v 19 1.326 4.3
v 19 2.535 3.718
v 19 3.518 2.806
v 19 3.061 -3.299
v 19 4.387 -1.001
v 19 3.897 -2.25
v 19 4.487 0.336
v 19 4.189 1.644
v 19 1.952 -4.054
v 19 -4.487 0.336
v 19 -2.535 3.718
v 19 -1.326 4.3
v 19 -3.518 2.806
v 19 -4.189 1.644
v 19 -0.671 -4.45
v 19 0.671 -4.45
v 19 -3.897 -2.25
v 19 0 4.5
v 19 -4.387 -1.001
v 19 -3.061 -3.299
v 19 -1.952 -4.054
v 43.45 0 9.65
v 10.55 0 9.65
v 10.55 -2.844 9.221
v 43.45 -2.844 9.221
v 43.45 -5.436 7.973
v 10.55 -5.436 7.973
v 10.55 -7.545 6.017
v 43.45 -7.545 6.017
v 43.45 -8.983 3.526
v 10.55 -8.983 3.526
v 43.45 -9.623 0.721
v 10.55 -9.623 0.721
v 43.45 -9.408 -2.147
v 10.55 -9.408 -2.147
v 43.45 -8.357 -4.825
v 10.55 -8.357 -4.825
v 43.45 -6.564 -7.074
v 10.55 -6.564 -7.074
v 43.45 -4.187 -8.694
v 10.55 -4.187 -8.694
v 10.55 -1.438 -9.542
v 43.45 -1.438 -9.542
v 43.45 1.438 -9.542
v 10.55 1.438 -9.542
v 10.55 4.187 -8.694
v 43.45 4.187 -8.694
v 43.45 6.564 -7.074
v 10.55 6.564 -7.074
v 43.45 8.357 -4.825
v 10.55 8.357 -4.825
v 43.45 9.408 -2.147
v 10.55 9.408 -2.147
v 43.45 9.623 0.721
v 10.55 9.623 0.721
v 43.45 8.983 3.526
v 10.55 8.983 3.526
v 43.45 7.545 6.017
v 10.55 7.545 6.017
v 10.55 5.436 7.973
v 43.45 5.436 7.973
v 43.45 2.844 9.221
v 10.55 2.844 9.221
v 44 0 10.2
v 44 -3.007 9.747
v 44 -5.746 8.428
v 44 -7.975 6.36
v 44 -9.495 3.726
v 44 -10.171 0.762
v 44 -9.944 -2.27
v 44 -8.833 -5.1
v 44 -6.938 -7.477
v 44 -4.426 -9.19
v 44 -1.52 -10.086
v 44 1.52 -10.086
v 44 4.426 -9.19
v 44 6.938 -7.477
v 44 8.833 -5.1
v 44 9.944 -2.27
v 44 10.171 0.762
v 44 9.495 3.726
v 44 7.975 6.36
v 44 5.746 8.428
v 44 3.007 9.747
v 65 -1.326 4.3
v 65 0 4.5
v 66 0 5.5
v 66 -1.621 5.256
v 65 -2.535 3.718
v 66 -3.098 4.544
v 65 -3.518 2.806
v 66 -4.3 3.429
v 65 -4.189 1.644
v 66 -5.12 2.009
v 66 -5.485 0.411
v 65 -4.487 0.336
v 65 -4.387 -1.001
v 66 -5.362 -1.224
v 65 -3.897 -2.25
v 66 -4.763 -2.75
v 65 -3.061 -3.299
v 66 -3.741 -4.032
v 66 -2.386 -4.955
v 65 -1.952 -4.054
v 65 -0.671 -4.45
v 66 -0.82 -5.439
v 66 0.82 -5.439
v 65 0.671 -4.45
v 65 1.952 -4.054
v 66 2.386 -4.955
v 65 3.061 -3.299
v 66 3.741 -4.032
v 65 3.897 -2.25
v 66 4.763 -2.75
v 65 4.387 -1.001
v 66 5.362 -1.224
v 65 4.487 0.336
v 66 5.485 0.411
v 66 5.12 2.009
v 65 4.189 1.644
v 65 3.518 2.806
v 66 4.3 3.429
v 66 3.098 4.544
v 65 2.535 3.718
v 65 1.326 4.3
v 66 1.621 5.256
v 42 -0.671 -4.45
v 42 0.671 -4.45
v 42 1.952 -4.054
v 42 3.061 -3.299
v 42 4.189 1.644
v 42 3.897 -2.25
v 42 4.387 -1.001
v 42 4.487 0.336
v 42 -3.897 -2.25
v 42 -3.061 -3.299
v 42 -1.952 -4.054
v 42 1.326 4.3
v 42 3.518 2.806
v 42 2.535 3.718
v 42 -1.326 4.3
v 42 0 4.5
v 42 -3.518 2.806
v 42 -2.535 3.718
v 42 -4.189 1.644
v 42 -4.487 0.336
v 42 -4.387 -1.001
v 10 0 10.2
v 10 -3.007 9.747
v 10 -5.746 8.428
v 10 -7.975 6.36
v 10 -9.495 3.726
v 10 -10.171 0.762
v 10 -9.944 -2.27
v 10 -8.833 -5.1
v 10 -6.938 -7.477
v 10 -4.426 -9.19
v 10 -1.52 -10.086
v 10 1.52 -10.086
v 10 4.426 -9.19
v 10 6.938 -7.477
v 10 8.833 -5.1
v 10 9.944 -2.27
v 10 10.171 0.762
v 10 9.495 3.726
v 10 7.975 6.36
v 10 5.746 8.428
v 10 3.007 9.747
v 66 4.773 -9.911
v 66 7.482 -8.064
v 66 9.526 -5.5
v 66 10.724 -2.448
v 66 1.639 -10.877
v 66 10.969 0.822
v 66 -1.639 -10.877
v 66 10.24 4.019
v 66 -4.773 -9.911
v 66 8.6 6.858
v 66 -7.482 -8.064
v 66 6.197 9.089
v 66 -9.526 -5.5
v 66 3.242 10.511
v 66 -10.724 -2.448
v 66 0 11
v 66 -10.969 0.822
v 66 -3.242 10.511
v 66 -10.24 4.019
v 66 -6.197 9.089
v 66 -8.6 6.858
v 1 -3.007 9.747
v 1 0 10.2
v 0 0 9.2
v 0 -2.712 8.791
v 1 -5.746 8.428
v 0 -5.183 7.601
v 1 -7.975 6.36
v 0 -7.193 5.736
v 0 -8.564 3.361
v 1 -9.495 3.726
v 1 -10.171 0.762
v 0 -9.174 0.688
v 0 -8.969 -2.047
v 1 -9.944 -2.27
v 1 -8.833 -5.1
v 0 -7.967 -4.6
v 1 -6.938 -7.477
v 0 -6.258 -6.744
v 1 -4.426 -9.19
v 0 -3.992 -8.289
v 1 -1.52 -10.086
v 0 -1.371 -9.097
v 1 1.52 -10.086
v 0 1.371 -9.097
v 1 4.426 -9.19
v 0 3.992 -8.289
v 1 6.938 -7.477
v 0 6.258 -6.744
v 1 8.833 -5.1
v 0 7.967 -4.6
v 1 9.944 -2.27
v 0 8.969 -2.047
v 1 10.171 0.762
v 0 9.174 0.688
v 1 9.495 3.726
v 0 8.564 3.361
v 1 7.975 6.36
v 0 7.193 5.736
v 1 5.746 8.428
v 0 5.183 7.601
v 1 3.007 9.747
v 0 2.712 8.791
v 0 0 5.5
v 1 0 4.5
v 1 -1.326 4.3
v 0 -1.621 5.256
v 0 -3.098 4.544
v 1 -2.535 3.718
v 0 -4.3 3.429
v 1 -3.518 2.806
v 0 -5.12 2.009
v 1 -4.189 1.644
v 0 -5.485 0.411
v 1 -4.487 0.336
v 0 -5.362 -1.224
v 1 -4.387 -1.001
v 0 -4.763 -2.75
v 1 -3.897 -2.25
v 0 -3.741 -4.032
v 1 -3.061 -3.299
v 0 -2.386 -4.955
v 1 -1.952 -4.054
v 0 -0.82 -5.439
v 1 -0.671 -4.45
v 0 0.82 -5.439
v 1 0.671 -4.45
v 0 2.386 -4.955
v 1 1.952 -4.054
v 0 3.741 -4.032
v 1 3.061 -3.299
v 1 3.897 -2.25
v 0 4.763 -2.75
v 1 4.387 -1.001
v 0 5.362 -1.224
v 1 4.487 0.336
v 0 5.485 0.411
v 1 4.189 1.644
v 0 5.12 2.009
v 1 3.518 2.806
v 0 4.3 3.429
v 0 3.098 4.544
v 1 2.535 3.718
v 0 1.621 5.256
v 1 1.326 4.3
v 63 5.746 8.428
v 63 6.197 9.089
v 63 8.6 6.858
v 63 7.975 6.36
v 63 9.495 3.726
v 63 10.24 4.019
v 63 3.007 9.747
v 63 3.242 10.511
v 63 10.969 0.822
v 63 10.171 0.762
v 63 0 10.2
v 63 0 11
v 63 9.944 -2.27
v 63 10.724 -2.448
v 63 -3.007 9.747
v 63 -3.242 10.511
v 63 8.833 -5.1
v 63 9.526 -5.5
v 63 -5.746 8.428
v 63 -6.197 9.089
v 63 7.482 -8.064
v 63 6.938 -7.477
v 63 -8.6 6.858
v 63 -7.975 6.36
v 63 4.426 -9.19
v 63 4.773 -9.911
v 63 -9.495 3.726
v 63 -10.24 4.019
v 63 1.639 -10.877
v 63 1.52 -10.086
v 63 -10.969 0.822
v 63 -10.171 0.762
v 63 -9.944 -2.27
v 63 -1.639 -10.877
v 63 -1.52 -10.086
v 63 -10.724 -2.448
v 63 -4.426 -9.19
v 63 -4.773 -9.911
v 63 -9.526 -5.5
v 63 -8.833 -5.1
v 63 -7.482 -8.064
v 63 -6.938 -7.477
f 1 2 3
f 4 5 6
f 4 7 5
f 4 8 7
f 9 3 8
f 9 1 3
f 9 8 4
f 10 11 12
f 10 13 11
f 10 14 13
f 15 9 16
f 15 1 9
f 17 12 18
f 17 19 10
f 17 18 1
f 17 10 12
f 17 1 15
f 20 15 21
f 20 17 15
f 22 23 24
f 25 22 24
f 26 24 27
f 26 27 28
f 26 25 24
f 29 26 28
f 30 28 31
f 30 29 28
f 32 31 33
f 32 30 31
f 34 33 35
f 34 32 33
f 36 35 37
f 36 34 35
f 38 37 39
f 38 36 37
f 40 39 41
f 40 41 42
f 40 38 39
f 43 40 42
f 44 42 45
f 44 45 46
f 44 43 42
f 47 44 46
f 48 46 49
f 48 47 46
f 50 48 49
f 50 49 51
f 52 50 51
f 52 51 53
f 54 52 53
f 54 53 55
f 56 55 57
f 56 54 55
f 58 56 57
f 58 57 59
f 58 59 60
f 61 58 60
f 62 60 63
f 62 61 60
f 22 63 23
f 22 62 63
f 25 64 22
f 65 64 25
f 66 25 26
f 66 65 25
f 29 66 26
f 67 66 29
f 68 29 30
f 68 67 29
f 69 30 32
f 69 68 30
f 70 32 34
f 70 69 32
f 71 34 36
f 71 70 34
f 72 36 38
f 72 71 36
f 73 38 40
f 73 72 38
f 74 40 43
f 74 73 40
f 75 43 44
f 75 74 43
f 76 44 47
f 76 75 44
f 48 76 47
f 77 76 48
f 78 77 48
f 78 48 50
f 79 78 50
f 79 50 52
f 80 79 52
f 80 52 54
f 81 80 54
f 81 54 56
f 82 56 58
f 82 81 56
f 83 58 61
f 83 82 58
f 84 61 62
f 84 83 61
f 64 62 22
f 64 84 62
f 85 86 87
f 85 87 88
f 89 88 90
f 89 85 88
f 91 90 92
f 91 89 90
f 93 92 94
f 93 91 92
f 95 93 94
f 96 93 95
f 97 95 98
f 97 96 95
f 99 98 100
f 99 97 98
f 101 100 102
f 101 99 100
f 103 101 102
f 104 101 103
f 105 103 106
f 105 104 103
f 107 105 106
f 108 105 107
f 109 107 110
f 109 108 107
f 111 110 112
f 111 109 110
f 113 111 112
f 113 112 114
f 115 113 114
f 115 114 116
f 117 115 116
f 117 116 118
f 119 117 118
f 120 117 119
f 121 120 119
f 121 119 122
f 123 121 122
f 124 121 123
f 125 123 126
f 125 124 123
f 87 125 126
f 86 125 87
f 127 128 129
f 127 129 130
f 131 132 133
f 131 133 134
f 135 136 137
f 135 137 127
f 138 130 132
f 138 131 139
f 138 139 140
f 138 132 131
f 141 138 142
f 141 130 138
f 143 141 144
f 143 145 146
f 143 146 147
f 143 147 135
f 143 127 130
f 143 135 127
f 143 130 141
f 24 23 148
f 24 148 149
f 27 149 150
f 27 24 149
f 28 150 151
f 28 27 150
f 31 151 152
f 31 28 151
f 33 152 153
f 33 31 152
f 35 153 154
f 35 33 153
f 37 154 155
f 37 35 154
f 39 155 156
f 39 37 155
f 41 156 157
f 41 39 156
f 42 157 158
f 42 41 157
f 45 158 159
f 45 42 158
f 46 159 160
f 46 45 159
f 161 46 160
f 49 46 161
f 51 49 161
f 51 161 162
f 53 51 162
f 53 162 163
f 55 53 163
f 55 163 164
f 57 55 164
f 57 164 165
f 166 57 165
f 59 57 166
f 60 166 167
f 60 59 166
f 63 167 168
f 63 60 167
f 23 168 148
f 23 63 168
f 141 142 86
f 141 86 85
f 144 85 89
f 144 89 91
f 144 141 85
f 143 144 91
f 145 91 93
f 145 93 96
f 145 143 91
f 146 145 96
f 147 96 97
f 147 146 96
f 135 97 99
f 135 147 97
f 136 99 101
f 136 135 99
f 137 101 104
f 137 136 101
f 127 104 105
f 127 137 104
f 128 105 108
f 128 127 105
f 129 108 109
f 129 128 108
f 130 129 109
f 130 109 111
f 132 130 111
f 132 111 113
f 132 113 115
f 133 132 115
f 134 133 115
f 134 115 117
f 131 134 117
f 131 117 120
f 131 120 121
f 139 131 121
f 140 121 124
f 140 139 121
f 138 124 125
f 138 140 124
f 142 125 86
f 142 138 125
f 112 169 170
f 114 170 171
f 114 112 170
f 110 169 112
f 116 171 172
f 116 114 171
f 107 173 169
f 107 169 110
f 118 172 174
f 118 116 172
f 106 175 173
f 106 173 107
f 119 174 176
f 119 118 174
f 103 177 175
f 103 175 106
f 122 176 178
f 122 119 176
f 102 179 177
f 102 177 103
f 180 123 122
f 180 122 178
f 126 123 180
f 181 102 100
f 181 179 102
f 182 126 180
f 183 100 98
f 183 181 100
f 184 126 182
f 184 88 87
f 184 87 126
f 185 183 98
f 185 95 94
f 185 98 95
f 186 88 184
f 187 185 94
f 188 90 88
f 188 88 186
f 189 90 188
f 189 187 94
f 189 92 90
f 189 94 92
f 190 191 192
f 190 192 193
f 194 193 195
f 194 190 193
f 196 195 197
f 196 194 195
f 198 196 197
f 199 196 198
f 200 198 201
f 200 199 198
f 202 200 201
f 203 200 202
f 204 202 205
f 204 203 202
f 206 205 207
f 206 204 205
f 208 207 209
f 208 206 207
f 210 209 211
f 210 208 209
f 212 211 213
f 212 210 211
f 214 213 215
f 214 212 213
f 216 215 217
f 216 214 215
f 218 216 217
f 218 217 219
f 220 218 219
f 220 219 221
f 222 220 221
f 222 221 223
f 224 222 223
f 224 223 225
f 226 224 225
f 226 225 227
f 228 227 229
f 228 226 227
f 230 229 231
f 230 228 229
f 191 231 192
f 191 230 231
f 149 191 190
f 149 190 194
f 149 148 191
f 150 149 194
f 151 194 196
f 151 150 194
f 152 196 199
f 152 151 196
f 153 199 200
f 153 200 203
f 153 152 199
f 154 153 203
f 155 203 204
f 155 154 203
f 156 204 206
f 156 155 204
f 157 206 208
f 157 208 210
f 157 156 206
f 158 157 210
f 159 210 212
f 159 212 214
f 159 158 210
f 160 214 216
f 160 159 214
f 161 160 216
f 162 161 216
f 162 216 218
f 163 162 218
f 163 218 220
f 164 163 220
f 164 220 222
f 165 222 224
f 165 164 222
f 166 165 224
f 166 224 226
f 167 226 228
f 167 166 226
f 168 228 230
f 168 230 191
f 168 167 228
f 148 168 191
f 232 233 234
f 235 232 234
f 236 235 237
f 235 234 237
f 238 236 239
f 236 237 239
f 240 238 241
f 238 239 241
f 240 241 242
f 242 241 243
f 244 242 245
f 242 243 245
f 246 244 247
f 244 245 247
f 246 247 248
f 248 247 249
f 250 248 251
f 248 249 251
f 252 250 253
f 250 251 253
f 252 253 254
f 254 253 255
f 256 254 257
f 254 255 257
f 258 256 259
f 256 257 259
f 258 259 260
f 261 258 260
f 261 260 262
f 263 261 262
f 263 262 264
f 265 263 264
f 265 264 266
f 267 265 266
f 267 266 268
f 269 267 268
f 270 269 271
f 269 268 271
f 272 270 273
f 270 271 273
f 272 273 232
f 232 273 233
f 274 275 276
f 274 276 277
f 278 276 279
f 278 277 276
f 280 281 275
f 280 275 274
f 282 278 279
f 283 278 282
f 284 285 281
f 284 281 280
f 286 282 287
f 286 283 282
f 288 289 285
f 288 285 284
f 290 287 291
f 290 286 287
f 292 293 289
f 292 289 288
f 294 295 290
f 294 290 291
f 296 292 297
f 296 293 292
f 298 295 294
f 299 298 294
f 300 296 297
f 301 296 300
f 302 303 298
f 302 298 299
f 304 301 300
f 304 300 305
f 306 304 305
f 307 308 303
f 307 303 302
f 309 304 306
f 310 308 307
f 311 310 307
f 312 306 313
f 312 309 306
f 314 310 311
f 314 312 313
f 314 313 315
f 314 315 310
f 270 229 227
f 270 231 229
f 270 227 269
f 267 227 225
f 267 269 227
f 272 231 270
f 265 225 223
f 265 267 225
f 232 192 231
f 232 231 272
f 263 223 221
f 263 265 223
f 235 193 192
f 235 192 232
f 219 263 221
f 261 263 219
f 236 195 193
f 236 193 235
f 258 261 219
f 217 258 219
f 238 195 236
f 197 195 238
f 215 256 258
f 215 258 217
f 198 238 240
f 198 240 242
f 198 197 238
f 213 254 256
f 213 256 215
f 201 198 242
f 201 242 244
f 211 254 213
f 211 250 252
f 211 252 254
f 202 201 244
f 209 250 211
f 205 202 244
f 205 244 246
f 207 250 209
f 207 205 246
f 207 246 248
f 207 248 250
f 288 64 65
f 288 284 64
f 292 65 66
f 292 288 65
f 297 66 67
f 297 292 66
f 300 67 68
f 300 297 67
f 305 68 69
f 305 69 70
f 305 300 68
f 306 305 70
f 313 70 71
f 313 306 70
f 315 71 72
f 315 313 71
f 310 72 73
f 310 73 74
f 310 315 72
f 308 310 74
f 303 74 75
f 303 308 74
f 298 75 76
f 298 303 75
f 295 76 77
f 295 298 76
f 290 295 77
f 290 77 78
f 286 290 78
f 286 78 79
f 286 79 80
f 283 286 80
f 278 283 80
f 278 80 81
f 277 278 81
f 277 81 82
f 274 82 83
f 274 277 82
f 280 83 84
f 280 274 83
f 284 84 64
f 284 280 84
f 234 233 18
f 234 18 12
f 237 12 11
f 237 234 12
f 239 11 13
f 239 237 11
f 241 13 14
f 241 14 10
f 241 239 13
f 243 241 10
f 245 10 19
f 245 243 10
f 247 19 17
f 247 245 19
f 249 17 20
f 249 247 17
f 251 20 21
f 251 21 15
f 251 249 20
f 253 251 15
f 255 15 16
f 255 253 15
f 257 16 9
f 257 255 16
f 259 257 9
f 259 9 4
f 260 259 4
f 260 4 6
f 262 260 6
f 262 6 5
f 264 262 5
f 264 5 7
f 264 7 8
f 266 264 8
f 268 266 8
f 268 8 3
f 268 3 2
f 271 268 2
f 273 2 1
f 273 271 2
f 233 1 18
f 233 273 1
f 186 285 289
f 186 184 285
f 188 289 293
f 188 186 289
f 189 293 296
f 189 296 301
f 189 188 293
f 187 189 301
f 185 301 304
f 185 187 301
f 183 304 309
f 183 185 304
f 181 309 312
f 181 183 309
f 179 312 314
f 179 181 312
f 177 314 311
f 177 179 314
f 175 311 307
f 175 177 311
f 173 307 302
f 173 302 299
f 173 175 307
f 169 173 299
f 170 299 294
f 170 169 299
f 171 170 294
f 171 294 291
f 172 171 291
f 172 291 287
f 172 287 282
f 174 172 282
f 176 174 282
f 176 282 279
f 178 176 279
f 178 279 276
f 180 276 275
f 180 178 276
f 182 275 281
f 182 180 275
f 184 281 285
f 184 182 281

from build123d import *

# Parameters (mm, degrees)
SFAZOWANIE1_SIZE = 1
SFAZOWANIE2_SIZE = 1
SFAZOWANIE3_SIZE = 1


with BuildPart() as part:
    # Szkic1 → Obrót1 (revolve)
    with BuildSketch(Plane.XY, mode=Mode.PRIVATE) as obr_t1_sk:
        Polygon((0, 4.5), (0, 10.2), (11, 10.2), (11, 9.65), (43, 9.65), (43, 10.2), (63, 10.2), (63, 11), (66, 11), (66, 4.5), (42, 4.5), (42, 0), (19, 0), (19, 4.5), align=None)
    revolve(obr_t1_sk.sketch.rotate(Axis((0, 0, 0), (1, 0, 0)), 90), axis=Axis((0, 0, 0), (1, 0, 0)))

    # Sfazowanie1
    sfazowanie1_edges = [part.edges().sort_by_distance(p)[0] for p in [
        (0, 0, -10.2),
    ]]
    chamfer(sfazowanie1_edges, length=SFAZOWANIE1_SIZE)

    # Sfazowanie2
    # the kernel refuses this chamfer: 1 mm, written as the material it takes off along each edge
    with BuildSketch(Plane(origin=(11, 0, 0), x_dir=(0, 0, 1), z_dir=(0, 1, 0))) as sfazowanie2_piece_1_section:
        Polygon((10.2, -SFAZOWANIE2_SIZE), (10.2 - SFAZOWANIE2_SIZE, 0), (10.2, 0), align=None)
    sfazowanie2_piece_1 = revolve(axis=Axis((11, 0, 0), (1, 0, 0)), mode=Mode.PRIVATE)
    sfazowanie2_piece_1 = sfazowanie2_piece_1 - Plane(origin=(10.282118865, 0, 0), x_dir=(0, 0, 1), z_dir=(1, 0, 0)) * Cylinder(9.65, 41, mode=Mode.PRIVATE)
    add(sfazowanie2_piece_1, mode=Mode.SUBTRACT)
    with BuildSketch(Plane(origin=(43, 0, 0), x_dir=(0, 0, 1), z_dir=(0, 1, 0))) as sfazowanie2_piece_2_section:
        Polygon((10.2 - SFAZOWANIE2_SIZE, 0), (10.2, SFAZOWANIE2_SIZE), (10.2, 0), align=None)
    sfazowanie2_piece_2 = revolve(axis=Axis((43, 0, 0), (1, 0, 0)), mode=Mode.PRIVATE)
    sfazowanie2_piece_2 = sfazowanie2_piece_2 - Plane(origin=(43.717881135, 0, 0), x_dir=(0, 0, 1), z_dir=(1, 0, 0)) * Cylinder(9.65, 41, mode=Mode.PRIVATE)
    add(sfazowanie2_piece_2, mode=Mode.SUBTRACT)

    # Sfazowanie3
    sfazowanie3_edges = [part.edges().sort_by_distance(p)[0] for p in [
        (0, 0, -4.5),
        (66, 0, -4.5),
    ]]
    chamfer(sfazowanie3_edges, length=SFAZOWANIE3_SIZE)


solid = part.part
